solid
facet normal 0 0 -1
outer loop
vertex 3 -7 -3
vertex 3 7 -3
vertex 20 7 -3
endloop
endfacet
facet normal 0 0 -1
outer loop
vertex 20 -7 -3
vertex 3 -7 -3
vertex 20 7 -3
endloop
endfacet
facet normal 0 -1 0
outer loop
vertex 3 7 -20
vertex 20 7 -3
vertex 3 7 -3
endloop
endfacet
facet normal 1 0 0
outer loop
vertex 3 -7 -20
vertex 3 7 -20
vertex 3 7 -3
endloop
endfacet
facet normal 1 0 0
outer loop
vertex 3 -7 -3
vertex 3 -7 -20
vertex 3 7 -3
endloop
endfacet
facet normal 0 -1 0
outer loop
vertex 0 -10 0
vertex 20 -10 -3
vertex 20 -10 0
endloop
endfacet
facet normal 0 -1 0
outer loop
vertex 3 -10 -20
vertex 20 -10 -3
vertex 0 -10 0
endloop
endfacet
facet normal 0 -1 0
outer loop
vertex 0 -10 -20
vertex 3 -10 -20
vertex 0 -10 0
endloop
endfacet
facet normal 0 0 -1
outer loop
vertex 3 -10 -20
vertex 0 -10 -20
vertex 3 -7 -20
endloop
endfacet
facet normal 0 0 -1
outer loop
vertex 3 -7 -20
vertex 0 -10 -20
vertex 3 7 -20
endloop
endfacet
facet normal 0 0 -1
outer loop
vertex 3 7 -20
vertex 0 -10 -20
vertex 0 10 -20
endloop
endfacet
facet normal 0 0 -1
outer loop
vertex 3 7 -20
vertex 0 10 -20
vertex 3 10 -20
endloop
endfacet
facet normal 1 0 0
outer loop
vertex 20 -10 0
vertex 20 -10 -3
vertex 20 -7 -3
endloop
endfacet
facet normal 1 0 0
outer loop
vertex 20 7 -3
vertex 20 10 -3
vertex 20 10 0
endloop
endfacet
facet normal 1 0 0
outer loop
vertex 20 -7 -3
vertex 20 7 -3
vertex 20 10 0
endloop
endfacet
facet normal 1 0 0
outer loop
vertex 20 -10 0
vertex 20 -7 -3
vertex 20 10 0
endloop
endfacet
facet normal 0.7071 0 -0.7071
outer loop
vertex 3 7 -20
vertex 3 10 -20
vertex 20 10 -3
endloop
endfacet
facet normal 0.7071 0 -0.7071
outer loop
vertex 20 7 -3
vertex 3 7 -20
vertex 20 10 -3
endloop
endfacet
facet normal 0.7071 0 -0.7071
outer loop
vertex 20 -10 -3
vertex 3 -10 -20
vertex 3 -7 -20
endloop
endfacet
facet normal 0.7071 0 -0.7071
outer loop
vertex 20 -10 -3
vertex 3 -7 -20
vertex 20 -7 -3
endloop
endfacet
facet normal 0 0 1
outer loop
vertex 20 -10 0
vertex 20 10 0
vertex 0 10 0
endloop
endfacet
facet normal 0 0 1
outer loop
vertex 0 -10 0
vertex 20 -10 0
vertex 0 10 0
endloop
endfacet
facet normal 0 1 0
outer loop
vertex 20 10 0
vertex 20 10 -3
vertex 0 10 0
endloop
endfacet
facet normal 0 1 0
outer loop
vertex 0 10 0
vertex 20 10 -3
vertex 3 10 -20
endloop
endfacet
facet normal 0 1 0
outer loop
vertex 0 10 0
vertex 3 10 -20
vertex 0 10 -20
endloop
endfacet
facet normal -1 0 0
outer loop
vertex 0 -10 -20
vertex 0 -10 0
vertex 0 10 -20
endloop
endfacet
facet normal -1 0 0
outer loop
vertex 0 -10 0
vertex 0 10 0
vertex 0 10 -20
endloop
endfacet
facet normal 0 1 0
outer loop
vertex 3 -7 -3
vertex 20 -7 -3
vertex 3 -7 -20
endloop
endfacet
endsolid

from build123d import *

# Parameters (mm, degrees)
EXTRUDE_1_DEPTH = 10
EXTRUDE_START   = -10
EXTRUDE_2_DEPTH = 3


with BuildPart() as part:
    # Эскиз1 → Бобышка-Вытянуть1 (new, symmetric)
    with BuildSketch(Plane(origin=(0, 0, 0), x_dir=(1, 0, 0), z_dir=(0, 1, 0))):
        Polygon((0, 20), (0, 0), (20, 0), (20, 3), (3, 3), (3, 20), align=None)
    extrude(amount=EXTRUDE_1_DEPTH, both=True)

    # Эскиз1<3> → Бобышка-Вытянуть2 (add)
    with BuildSketch(Plane(origin=(0, 0, 0), x_dir=(1, 0, 0), z_dir=(0, 1, 0)).offset(EXTRUDE_START)):
        Polygon((20, 3), (3, 20), (3, 3), align=None)
    extrude_2 = extrude(amount=EXTRUDE_2_DEPTH)

    # Зеркальное отражение2: Бобышка-Вытянуть2 across plane
    add(extrude_2.mirror(Plane.ZX))


solid = part.part
